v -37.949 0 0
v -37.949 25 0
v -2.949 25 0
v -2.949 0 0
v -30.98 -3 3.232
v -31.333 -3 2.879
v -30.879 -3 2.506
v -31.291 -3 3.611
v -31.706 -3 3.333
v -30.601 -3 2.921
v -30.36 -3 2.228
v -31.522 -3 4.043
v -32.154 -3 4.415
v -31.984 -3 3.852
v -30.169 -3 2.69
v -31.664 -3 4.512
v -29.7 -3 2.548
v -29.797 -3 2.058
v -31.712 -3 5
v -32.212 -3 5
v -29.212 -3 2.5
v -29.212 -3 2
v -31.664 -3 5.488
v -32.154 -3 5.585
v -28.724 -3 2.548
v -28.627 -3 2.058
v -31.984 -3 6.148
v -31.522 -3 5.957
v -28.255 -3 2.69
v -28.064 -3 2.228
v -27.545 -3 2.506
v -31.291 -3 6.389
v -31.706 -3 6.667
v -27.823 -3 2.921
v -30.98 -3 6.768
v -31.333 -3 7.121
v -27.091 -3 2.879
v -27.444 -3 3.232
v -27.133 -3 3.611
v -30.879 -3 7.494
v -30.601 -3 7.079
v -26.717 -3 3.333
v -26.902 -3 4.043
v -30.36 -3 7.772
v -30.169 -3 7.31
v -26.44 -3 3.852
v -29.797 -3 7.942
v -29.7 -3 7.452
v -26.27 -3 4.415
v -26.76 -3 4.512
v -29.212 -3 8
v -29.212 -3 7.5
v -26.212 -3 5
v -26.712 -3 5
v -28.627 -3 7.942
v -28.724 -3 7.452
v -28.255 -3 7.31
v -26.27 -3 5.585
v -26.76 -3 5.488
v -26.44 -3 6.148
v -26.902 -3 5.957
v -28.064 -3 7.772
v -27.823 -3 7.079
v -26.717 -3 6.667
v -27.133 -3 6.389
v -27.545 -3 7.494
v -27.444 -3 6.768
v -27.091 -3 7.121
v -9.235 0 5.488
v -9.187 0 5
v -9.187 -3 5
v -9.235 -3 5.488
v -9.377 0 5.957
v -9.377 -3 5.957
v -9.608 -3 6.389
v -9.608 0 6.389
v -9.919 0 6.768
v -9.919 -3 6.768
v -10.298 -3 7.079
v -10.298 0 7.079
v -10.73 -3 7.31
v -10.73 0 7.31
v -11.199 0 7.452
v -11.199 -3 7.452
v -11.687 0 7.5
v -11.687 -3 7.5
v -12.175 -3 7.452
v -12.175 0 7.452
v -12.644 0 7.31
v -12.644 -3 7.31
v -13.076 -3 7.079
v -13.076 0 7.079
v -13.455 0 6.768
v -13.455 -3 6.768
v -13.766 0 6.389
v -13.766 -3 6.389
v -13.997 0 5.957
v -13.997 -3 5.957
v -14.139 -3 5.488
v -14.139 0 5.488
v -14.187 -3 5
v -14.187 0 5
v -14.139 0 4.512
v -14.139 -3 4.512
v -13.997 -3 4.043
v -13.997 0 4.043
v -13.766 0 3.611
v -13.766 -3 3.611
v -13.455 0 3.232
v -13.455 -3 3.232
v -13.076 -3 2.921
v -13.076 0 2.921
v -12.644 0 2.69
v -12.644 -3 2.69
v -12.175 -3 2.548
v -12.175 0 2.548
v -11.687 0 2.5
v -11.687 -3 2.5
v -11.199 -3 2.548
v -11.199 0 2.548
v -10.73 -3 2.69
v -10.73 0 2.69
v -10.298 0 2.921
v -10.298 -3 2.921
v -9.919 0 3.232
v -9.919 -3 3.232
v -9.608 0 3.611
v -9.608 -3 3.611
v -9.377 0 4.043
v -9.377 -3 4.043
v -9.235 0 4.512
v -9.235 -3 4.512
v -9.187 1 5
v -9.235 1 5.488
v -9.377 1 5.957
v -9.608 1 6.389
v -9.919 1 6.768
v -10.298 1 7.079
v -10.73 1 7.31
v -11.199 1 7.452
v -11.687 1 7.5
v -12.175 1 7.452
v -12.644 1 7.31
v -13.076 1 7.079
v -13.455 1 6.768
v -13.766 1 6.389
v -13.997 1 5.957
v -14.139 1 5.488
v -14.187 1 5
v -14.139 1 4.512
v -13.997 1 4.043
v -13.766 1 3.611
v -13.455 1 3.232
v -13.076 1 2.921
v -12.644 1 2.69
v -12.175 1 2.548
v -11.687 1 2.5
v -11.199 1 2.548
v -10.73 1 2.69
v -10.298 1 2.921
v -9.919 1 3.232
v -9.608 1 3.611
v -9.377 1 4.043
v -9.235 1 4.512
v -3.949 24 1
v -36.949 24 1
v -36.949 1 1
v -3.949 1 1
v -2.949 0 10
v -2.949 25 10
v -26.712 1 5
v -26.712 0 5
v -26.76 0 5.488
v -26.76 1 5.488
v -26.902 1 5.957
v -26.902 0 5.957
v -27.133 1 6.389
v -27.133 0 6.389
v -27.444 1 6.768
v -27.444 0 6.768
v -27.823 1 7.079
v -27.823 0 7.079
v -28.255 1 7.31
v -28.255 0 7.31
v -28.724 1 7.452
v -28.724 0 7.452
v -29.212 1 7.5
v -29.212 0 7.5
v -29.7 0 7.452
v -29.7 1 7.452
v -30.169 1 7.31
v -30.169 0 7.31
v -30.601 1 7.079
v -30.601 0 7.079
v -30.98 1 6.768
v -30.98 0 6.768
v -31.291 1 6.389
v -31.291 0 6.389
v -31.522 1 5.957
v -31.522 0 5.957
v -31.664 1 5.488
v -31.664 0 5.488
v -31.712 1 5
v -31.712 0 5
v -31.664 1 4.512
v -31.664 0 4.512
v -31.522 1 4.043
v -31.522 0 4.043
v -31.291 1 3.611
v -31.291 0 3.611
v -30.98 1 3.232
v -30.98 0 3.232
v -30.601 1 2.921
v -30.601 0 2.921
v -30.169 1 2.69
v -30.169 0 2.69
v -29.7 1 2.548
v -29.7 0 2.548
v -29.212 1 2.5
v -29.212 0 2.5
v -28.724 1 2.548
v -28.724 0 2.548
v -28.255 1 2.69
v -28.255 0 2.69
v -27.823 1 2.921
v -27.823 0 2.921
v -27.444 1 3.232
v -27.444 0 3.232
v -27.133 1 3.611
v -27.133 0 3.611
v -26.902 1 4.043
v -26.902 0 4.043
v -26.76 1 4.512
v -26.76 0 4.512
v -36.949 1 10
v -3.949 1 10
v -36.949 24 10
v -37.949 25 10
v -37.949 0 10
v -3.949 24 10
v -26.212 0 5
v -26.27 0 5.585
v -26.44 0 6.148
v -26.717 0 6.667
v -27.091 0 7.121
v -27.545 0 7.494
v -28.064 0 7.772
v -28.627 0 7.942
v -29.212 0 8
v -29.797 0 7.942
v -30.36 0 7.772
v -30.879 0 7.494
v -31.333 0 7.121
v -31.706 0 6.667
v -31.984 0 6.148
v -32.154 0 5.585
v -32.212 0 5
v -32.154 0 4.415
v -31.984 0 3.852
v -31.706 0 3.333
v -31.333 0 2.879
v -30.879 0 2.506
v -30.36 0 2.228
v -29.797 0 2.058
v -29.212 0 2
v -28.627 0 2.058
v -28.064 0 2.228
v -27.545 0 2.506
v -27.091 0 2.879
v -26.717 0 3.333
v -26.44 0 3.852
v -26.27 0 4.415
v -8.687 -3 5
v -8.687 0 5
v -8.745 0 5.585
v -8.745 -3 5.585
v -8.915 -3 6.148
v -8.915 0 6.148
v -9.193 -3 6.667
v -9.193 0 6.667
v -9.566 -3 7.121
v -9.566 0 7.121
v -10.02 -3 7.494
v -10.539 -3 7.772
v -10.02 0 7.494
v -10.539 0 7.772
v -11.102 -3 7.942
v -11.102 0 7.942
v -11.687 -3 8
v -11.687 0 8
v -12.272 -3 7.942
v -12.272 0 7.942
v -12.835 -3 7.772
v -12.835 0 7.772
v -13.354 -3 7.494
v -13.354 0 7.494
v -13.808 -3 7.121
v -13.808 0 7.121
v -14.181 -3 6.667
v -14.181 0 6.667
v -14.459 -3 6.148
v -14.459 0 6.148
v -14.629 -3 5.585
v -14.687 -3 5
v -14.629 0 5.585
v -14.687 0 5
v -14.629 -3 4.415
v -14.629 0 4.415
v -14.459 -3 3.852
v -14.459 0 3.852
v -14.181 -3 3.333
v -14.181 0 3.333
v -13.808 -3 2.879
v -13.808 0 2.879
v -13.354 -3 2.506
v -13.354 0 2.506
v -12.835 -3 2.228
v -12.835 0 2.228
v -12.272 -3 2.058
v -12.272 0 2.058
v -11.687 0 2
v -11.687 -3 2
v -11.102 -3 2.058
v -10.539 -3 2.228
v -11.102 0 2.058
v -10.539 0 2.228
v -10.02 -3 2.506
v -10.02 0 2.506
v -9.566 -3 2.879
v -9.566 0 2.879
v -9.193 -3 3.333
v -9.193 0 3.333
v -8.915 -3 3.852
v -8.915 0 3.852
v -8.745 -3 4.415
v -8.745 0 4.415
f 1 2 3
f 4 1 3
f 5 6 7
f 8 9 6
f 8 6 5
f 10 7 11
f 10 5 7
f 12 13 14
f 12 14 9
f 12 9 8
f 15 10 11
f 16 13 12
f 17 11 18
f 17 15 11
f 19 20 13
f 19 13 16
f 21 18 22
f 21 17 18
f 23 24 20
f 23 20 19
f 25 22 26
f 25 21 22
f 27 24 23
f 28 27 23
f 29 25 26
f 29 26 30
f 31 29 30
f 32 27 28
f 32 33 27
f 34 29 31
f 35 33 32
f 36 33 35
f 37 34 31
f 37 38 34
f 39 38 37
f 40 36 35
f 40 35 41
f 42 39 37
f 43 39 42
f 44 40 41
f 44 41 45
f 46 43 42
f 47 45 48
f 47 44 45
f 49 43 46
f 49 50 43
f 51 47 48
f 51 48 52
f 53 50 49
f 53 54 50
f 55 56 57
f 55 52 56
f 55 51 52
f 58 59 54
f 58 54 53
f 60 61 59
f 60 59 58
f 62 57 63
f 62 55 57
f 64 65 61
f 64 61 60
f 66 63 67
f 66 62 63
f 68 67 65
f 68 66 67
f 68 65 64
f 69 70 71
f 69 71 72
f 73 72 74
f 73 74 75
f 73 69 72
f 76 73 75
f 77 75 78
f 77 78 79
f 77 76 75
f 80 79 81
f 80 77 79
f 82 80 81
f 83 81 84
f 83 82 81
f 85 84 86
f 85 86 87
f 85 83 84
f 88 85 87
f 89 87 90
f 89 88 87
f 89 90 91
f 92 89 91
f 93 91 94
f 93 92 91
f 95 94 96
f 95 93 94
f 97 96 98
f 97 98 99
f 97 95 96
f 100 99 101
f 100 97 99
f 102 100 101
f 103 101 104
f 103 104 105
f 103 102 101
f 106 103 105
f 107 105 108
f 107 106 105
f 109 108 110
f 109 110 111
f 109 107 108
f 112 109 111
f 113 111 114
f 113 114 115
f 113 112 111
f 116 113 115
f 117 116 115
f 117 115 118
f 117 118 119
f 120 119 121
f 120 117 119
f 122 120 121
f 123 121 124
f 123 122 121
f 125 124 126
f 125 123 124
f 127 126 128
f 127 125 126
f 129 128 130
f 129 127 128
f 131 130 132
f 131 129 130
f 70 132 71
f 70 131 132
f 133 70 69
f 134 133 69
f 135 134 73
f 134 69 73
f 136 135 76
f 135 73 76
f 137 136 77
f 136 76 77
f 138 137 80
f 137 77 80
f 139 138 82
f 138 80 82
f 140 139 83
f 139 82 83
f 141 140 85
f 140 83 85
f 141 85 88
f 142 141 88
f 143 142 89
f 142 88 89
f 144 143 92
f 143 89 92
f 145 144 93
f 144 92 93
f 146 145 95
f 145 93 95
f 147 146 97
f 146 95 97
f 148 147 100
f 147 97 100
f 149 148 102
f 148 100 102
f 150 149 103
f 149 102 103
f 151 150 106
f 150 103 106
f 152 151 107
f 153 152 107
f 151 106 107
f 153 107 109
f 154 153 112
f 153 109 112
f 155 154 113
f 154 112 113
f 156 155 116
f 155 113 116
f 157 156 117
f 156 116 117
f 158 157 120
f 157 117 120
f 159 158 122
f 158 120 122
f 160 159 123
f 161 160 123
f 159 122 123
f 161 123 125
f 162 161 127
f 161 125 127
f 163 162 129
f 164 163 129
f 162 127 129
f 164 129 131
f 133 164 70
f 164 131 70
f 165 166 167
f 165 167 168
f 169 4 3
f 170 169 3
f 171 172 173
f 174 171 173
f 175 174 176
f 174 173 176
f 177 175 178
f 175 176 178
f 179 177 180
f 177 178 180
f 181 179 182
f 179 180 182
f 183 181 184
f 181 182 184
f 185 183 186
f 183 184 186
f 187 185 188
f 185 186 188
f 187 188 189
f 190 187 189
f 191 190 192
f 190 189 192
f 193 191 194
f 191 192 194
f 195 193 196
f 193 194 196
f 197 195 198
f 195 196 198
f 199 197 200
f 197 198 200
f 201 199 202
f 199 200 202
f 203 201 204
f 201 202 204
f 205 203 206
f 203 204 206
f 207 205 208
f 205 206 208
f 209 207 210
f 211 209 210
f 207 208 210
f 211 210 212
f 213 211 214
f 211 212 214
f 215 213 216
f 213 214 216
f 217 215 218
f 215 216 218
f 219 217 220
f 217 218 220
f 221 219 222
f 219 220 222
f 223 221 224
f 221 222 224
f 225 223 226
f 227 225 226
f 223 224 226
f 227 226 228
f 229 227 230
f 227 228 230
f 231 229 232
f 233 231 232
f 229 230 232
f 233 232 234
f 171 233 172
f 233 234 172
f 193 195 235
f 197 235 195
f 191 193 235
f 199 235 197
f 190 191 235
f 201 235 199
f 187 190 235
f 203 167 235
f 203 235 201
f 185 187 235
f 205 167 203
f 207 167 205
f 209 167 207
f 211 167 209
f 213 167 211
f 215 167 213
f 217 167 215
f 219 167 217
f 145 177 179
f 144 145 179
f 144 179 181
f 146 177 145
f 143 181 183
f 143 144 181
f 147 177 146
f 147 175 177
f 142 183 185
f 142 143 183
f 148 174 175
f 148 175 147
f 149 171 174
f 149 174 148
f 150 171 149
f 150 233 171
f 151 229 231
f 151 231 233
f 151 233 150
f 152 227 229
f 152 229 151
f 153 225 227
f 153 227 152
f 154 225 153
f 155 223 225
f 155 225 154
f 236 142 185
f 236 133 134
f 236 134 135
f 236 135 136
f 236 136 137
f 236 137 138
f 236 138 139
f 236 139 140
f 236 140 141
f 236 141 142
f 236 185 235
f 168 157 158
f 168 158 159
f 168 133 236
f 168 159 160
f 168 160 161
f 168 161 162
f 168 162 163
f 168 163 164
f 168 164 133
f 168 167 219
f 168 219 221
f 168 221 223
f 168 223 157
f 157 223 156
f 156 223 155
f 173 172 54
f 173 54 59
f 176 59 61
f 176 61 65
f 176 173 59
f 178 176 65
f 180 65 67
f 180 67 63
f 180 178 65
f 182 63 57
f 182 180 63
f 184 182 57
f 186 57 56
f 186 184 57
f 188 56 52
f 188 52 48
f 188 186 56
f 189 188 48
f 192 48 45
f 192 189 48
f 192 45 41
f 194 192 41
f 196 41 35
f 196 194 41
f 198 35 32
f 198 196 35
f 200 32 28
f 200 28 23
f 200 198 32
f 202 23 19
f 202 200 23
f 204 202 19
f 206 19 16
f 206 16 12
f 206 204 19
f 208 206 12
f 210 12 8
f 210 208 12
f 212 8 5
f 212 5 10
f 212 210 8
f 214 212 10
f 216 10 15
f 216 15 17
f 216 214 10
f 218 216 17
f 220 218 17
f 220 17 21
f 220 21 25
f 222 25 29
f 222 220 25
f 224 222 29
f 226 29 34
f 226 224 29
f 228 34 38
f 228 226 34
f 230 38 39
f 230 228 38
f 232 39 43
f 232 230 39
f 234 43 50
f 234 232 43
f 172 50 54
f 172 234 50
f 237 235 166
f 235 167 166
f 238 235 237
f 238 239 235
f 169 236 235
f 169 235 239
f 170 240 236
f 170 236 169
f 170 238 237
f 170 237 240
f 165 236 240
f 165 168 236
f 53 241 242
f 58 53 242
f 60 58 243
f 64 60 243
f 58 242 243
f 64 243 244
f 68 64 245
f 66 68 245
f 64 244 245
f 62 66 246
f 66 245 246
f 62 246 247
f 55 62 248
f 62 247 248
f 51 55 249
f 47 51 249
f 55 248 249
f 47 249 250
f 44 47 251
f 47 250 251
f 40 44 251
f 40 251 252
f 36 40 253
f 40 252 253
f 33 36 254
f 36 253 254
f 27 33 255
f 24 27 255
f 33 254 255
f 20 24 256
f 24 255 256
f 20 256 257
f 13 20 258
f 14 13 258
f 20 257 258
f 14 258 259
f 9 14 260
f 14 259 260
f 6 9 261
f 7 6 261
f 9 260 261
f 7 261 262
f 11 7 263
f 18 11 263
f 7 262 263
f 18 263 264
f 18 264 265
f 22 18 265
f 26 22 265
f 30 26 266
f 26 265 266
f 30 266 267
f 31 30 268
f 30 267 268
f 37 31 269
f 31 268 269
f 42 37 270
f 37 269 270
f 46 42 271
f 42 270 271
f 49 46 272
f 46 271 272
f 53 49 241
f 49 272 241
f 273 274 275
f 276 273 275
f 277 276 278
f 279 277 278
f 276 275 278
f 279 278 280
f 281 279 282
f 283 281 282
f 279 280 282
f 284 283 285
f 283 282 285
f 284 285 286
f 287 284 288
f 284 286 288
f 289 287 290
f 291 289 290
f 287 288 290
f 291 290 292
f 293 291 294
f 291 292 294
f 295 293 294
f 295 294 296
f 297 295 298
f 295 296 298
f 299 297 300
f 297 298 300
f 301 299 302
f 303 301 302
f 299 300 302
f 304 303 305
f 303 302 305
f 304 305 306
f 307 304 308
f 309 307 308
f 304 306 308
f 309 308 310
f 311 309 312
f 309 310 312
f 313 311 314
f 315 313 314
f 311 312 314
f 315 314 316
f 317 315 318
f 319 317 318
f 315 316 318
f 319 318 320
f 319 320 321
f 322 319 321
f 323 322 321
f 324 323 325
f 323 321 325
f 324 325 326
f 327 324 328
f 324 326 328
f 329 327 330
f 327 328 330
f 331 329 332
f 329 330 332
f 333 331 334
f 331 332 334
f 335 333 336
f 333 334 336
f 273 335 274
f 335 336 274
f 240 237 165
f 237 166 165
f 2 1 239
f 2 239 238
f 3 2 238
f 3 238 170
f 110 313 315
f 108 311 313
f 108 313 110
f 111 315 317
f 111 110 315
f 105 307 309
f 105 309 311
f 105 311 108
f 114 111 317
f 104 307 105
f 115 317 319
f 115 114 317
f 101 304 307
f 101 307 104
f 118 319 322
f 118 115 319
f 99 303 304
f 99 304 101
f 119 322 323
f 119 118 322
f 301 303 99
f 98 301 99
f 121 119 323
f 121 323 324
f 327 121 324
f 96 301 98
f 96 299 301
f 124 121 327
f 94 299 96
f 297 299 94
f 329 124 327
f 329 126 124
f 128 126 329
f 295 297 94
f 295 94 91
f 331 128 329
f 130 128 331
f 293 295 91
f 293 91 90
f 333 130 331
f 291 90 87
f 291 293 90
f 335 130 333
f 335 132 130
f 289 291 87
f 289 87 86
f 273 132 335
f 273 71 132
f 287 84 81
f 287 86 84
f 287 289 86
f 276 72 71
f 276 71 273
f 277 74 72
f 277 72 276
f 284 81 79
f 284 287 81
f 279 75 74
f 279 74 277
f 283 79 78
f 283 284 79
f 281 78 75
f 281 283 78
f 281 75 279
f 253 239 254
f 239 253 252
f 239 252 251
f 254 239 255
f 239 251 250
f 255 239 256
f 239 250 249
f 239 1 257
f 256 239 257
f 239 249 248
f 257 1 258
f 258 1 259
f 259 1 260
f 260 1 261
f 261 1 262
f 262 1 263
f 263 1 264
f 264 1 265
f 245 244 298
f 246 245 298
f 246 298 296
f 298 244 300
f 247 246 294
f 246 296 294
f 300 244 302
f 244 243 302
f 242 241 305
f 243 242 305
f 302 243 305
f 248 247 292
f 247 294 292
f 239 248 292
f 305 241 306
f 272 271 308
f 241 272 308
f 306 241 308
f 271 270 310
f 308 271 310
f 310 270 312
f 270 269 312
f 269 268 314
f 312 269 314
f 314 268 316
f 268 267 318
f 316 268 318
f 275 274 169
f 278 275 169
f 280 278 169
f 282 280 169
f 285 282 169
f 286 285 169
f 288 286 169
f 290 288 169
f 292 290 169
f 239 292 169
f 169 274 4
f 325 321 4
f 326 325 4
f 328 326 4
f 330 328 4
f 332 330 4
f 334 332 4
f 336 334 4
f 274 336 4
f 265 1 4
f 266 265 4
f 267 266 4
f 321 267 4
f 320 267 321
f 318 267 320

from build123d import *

# Parameters (mm, degrees)
F0_W     = 35
F0_H     = 25
F1_DEPTH = 10
F3_T     = -1
F2_R     = 3
F2_R_2   = 2.5
F4_DEPTH = 3
F5_DEPTH = 1


with BuildPart() as f1:
    # F0 (on Top) → F1 (new body)
    with BuildSketch(Plane.XY):
        with Locations((-20.4494718197, 12.5)):
            Rectangle(F0_W, F0_H)
    extrude(amount=F1_DEPTH)

    # F3
    f3_openings = [f1.faces().sort_by_distance(p)[0] for p in [
        (-20.449472, 12.5, 10),
    ]]
    offset(amount=F3_T, openings=f3_openings)

    # F2 (on face) → F4 (join)
    with BuildSketch(Plane.XZ):
        with Locations((-29.2118718197, 5)):
            Circle(F2_R)
        with Locations((-29.2118718197, 5)):
            Circle(F2_R_2, mode=Mode.SUBTRACT)
        with Locations((-11.6870718197, 5)):
            Circle(F2_R)
        with Locations((-11.6870718197, 5)):
            Circle(F2_R_2, mode=Mode.SUBTRACT)
    extrude(amount=F4_DEPTH)

    # F5 (cut): faces of the model
    f5_faces = [f1.faces().sort_by_distance(p)[0] for p in [
        (-29.2118718197, 0, 5),
        (-11.6870718197, 0, 5),
    ]]
    extrude(f5_faces, amount=-F5_DEPTH, mode=Mode.SUBTRACT)


solid = f1.part
